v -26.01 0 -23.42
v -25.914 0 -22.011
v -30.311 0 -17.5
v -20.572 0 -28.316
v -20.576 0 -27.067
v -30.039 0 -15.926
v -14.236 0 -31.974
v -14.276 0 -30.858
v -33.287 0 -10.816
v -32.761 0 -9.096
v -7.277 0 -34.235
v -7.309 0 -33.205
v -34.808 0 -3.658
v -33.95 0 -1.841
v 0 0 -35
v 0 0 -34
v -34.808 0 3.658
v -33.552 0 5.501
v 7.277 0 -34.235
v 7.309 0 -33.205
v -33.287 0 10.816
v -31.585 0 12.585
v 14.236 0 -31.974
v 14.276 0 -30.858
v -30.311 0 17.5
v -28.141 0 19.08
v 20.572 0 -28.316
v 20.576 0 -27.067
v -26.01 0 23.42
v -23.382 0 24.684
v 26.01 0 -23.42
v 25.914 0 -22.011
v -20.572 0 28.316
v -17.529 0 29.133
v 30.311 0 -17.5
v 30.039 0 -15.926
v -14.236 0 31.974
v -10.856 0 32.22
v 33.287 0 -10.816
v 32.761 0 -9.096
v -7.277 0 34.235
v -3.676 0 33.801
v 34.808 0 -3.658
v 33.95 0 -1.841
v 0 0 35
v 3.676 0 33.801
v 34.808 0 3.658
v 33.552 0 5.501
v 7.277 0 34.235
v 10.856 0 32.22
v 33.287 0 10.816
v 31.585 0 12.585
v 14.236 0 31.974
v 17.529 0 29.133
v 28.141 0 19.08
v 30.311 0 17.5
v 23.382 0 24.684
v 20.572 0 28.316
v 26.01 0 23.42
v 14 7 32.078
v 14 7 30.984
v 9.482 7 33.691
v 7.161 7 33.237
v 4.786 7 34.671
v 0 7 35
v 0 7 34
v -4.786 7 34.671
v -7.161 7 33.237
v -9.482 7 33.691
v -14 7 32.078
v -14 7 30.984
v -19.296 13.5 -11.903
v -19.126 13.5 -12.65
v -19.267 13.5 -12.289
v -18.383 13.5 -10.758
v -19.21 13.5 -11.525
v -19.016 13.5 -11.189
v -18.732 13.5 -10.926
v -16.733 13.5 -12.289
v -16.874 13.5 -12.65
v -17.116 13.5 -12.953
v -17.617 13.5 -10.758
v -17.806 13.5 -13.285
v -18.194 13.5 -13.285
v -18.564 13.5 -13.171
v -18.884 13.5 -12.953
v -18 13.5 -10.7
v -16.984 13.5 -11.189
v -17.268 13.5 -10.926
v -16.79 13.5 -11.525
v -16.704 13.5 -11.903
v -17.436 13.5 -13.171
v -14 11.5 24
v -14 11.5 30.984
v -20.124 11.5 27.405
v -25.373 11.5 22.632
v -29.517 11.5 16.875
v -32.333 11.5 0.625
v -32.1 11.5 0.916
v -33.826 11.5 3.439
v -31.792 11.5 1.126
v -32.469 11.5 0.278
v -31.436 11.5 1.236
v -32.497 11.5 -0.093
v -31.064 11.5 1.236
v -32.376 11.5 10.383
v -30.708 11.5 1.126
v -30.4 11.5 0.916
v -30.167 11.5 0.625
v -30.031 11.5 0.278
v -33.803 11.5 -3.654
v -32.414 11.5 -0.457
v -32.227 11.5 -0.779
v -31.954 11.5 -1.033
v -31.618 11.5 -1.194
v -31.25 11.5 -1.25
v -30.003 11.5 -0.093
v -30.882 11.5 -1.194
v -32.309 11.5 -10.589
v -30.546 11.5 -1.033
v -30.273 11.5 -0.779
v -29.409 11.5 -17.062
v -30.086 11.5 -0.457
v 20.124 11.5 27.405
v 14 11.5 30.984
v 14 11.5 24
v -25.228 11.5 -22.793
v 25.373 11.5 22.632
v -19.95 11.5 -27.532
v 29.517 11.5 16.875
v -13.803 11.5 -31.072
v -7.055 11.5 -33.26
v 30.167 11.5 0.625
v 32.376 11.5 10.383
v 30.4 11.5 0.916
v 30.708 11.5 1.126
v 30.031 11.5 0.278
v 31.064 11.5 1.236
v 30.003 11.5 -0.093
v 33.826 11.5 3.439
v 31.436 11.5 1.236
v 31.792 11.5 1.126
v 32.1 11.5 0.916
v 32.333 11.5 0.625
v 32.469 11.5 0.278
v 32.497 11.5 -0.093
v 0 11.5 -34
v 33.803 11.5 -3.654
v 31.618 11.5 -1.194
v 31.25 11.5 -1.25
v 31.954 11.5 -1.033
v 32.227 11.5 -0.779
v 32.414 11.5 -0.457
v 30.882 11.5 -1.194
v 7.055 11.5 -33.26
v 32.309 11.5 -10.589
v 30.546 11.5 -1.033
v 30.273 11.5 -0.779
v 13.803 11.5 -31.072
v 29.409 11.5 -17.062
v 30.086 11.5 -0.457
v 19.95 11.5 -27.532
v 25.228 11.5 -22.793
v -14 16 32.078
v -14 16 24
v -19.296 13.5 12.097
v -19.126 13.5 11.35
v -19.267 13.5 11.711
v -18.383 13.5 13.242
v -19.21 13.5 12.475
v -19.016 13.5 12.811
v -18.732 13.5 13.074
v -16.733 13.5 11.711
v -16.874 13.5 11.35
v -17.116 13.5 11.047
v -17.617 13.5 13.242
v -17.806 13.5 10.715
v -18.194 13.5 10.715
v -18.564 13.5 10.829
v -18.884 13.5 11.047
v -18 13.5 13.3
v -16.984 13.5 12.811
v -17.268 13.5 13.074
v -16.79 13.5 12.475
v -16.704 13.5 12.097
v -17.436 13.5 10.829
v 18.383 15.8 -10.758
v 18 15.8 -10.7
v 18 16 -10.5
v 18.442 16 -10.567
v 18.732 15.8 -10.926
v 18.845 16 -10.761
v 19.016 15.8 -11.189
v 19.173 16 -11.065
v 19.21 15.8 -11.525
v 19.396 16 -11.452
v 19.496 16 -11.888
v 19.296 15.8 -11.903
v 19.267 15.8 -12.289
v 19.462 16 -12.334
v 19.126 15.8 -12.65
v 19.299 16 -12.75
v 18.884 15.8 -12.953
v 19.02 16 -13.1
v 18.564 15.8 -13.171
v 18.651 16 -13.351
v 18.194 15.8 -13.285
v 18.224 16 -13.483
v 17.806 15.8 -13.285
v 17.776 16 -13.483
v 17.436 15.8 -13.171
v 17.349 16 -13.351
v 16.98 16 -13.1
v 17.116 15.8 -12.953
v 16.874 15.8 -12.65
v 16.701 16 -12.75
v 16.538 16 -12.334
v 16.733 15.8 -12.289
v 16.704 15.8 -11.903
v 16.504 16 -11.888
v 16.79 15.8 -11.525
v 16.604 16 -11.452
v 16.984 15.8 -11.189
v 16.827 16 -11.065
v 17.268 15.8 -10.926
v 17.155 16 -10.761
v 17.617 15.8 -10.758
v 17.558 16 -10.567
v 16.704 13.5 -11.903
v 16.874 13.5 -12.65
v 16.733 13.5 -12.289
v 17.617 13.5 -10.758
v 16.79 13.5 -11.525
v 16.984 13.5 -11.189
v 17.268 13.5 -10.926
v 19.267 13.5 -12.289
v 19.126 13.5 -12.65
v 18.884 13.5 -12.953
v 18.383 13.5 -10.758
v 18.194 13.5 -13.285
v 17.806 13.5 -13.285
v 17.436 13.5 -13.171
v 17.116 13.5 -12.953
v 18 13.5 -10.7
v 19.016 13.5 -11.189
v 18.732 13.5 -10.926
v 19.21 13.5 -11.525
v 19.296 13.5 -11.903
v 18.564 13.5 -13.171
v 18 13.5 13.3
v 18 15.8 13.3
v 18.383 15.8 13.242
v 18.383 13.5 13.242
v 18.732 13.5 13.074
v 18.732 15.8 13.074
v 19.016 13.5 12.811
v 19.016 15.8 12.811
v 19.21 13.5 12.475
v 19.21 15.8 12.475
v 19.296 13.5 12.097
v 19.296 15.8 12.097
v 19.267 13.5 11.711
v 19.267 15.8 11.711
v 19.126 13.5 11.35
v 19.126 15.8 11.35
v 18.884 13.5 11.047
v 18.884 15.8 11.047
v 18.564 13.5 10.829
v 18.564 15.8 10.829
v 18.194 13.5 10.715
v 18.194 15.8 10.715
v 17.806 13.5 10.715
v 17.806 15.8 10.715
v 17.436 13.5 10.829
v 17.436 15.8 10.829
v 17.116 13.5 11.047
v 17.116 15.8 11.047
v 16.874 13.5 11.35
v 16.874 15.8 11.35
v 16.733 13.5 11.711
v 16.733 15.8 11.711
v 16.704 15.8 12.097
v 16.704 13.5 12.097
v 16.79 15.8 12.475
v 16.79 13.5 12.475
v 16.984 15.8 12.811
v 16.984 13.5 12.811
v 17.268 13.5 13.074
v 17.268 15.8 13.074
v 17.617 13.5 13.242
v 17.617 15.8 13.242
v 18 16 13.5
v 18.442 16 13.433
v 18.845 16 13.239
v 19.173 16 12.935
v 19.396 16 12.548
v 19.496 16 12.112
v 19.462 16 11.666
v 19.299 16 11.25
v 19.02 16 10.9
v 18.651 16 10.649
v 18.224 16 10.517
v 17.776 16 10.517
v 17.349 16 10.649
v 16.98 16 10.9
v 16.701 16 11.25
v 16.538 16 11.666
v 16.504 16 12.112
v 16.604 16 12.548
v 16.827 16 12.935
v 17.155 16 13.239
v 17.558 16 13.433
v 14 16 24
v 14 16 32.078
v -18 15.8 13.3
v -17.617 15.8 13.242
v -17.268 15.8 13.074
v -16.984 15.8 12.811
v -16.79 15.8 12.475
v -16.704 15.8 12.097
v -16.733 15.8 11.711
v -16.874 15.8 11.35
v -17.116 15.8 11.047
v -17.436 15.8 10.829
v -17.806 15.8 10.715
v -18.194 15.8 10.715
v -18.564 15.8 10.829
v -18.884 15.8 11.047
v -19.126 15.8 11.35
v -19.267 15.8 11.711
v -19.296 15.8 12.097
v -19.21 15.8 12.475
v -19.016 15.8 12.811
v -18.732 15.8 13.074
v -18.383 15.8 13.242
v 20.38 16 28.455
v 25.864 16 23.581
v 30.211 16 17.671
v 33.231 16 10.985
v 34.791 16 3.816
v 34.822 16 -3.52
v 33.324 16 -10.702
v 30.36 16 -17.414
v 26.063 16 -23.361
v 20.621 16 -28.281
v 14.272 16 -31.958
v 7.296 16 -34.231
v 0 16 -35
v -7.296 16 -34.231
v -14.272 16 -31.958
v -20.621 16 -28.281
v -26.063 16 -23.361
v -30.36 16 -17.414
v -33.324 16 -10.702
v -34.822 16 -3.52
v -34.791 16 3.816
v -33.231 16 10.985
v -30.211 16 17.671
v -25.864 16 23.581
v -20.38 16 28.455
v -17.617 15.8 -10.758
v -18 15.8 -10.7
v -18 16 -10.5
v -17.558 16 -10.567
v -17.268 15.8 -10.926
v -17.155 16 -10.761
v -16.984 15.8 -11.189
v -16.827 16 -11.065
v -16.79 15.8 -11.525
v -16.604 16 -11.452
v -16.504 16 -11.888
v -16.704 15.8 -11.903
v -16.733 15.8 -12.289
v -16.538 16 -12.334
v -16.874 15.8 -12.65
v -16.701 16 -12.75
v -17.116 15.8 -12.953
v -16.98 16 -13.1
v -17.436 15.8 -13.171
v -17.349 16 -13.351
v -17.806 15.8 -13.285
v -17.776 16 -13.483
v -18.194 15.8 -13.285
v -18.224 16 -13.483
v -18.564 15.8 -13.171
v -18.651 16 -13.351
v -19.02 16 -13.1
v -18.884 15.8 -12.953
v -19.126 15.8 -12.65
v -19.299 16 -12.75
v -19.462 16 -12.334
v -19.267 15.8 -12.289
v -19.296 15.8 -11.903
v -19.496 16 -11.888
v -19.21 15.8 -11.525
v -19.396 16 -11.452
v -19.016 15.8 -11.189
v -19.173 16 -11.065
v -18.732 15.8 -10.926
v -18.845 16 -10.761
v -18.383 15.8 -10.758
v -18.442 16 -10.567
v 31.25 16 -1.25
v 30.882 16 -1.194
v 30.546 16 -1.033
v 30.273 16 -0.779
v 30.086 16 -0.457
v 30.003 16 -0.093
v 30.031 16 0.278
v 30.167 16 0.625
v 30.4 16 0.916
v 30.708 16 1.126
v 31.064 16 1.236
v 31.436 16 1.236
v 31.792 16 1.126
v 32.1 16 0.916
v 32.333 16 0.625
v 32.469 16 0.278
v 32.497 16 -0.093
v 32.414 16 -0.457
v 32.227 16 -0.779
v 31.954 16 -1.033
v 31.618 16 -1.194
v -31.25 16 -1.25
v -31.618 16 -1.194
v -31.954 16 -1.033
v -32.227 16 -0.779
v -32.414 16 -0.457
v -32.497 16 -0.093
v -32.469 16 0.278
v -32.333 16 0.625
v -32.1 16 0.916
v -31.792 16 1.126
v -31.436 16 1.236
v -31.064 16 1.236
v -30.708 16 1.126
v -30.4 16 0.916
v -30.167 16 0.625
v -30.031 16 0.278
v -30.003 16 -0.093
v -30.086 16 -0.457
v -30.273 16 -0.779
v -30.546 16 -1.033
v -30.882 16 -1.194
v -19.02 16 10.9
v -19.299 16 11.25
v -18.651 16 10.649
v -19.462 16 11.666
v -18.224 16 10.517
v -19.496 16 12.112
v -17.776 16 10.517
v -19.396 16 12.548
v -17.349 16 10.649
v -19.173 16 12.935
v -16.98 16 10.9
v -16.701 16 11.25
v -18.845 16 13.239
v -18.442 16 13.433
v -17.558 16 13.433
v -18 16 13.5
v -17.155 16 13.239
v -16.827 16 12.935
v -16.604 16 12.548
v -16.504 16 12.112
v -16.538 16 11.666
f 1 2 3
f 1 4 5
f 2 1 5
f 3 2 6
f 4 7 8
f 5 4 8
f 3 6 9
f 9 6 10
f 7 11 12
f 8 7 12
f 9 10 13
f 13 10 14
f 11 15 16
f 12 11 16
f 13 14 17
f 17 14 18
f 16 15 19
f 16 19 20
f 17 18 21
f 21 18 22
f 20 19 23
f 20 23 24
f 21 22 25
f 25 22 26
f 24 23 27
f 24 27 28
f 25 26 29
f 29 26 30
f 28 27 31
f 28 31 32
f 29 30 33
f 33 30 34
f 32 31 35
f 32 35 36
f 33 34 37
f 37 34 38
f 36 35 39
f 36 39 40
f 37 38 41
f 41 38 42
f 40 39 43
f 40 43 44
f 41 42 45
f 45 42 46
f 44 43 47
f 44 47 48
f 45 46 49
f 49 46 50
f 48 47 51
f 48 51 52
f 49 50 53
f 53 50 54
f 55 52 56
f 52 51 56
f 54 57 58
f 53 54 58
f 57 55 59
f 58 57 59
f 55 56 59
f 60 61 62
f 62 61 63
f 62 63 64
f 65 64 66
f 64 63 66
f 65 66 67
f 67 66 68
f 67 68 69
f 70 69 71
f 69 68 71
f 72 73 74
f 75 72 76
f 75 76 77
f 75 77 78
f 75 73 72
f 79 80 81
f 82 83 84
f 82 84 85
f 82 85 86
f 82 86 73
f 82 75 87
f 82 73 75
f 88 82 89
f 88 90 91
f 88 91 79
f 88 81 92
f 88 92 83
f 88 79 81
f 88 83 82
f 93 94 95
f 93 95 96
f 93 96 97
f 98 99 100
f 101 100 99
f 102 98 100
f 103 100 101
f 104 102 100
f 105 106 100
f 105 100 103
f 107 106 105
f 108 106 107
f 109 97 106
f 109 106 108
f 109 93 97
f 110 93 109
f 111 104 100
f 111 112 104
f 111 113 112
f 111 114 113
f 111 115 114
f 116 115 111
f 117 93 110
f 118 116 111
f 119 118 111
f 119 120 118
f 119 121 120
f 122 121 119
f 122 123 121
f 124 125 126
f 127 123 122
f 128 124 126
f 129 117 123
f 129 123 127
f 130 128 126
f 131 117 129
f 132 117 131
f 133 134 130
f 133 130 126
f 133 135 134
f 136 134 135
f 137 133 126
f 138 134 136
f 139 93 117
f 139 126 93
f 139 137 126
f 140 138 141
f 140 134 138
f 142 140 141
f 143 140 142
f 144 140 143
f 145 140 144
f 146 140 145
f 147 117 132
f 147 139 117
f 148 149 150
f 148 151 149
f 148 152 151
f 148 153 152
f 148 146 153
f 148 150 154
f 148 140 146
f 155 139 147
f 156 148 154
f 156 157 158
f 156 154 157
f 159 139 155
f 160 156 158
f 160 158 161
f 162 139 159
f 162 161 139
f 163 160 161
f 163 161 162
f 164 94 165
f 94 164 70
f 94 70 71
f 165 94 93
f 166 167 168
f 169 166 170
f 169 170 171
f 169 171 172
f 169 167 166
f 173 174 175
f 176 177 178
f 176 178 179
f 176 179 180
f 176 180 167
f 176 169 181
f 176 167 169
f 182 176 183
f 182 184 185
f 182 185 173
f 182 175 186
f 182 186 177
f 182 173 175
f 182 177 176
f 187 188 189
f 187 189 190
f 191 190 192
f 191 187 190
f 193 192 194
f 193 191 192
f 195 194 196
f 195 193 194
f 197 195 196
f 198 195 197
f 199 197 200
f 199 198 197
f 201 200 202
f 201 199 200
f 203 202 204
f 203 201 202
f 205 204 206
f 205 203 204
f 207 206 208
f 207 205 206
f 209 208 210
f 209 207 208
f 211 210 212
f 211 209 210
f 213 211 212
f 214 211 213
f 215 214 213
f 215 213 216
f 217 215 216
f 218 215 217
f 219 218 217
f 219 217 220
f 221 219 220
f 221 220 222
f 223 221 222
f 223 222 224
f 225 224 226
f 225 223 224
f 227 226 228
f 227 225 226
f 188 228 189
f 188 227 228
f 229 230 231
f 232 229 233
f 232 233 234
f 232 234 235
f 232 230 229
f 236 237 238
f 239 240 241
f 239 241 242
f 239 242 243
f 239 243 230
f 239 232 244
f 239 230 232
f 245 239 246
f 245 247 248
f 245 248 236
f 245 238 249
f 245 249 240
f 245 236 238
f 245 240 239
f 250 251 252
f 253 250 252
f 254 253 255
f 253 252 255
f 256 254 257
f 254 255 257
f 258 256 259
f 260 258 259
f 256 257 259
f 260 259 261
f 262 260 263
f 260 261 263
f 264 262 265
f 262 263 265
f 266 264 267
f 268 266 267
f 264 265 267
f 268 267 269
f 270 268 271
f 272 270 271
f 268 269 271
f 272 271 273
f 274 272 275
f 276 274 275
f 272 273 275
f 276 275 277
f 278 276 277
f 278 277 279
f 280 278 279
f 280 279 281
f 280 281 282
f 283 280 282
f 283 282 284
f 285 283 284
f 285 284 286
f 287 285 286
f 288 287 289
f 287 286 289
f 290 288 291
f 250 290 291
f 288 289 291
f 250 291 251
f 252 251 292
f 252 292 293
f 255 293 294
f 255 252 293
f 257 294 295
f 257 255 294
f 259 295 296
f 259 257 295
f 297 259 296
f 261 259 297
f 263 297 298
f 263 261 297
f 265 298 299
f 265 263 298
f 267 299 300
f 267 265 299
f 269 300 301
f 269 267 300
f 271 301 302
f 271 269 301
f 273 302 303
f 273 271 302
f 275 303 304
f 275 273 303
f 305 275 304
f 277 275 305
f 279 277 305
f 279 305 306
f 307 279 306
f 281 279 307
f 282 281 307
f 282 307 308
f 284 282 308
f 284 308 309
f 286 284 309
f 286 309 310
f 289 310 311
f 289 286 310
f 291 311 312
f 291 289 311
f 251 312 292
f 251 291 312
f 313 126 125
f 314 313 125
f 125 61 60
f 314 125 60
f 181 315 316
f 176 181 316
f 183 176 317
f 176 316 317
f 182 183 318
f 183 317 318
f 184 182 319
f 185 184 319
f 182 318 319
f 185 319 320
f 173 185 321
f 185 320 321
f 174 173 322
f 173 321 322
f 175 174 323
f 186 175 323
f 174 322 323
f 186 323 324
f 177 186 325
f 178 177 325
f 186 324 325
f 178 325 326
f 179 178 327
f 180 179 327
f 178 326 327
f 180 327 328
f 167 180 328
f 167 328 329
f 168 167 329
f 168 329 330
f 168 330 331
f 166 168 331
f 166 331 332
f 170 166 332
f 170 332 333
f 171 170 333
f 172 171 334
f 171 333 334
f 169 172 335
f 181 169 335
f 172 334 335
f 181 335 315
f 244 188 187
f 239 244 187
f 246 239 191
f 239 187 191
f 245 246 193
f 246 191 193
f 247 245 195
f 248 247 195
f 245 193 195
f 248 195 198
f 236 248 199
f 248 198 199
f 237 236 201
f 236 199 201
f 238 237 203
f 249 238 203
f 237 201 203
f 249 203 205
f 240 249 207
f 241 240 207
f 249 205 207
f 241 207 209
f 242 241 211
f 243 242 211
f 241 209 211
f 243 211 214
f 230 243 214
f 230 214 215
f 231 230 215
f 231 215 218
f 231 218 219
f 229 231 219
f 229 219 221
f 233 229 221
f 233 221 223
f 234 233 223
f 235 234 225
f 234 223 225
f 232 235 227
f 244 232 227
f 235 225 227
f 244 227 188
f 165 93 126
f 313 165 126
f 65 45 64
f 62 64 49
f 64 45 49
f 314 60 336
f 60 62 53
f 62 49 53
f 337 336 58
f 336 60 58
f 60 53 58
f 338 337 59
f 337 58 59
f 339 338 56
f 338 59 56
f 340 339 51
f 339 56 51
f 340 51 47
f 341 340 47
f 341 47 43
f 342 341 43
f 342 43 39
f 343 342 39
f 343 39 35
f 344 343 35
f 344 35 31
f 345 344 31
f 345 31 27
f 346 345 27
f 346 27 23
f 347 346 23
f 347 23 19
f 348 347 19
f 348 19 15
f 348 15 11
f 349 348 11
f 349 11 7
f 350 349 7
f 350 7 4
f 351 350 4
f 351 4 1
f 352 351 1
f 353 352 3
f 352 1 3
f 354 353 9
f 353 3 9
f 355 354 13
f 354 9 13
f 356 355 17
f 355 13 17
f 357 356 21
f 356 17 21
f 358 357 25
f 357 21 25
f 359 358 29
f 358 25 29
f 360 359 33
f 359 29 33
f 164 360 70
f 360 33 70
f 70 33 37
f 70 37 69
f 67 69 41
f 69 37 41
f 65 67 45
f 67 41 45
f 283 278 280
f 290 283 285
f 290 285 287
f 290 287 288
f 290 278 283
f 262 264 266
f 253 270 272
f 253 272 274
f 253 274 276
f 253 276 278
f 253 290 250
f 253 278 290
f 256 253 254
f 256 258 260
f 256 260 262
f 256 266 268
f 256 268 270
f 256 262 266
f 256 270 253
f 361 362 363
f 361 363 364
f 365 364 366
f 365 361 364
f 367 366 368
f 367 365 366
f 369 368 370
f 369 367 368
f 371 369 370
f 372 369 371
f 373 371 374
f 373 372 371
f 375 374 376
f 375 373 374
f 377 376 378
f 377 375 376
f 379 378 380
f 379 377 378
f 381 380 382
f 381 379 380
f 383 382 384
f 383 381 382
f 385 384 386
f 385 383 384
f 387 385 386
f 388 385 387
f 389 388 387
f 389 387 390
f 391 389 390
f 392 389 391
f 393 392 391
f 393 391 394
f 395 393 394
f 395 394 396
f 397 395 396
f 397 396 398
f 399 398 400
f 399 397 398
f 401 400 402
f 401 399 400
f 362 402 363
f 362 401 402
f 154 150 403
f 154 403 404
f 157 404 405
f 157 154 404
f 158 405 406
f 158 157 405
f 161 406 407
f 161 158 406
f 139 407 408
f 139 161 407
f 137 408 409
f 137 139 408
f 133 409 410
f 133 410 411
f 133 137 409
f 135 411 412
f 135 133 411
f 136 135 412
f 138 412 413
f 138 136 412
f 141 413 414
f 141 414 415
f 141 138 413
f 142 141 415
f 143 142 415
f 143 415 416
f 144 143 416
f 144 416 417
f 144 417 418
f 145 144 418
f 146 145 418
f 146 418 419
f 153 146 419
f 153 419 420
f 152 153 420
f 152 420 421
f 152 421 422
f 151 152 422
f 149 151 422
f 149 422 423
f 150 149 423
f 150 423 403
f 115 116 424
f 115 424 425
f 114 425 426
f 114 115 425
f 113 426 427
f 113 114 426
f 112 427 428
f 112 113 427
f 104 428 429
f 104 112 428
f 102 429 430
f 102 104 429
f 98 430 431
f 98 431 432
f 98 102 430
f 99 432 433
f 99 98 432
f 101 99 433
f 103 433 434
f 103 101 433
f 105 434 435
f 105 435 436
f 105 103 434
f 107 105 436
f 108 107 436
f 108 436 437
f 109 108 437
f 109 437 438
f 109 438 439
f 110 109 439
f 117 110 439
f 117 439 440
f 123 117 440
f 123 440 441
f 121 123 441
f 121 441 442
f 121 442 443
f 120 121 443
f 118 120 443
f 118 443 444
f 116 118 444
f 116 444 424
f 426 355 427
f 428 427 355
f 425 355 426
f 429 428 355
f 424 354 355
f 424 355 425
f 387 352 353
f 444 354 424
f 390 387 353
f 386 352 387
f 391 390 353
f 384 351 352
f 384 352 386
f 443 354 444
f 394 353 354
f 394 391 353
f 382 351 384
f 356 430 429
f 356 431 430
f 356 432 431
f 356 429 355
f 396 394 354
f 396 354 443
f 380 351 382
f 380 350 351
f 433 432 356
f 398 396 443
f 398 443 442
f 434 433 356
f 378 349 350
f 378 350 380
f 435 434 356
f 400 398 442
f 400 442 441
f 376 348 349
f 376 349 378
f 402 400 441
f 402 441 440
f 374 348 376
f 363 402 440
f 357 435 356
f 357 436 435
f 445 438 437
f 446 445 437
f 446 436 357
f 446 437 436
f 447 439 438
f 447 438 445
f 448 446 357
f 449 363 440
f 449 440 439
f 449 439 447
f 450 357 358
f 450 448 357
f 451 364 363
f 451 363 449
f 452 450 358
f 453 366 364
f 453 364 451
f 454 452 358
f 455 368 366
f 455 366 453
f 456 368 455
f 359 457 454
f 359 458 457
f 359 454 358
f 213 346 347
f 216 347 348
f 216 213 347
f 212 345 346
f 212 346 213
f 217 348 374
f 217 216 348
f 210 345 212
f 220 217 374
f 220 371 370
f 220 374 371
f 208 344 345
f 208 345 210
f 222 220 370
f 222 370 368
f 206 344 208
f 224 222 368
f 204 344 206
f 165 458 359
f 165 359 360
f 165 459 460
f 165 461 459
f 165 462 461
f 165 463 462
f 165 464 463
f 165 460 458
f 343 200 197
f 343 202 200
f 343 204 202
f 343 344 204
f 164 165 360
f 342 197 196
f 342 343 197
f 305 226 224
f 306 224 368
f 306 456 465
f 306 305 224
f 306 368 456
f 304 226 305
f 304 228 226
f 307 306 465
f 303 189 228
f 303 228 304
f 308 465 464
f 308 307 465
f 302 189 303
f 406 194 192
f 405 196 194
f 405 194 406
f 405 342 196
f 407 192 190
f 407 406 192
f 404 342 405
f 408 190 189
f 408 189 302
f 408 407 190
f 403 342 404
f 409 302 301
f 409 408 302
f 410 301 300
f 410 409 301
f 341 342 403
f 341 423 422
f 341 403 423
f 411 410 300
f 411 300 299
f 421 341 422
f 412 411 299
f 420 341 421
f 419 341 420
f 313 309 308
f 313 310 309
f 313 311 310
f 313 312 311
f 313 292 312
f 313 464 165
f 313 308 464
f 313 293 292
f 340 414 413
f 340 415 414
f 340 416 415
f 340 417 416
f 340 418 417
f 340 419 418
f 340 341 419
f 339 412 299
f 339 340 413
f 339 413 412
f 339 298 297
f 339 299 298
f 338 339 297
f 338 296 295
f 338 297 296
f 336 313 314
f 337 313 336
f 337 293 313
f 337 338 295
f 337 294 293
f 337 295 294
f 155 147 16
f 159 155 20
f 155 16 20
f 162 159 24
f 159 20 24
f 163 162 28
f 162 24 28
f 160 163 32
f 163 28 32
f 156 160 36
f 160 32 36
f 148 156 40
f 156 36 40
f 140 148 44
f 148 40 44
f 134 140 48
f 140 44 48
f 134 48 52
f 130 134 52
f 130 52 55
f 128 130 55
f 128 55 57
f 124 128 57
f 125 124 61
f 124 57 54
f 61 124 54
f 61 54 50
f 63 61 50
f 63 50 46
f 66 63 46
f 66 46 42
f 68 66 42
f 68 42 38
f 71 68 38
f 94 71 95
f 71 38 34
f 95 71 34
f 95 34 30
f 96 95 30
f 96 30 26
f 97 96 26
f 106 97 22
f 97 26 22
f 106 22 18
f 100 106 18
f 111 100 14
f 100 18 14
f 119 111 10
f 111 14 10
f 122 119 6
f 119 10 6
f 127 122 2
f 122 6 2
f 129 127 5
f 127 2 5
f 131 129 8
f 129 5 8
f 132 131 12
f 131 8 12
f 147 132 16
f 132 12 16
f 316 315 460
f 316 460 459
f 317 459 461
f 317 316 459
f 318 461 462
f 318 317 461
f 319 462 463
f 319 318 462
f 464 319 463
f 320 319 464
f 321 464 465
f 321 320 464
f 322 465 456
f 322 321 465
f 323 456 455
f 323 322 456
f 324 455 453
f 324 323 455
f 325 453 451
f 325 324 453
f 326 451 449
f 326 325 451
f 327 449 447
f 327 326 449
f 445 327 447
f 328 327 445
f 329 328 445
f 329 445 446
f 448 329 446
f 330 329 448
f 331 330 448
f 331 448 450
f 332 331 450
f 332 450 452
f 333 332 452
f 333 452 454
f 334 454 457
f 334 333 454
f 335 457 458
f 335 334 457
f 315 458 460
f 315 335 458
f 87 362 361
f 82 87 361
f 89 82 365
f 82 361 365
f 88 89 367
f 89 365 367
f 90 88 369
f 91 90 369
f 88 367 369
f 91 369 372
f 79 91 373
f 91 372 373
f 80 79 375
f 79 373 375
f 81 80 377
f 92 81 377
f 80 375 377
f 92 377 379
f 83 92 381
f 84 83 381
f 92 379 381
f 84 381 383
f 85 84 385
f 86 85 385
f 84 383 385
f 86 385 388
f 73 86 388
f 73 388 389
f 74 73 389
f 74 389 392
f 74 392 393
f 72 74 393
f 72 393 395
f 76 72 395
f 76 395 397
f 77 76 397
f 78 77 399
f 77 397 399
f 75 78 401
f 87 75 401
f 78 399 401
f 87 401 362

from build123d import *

# Parameters (mm, degrees)
SKETCH_1_R          = 35
EXTRUDE_1_DEPTH     = 16
SKETCH_2_R          = 34
CUT_EXTRUDE_1_DEPTH = 11.5
SKETCH_3_R          = 1.25
CUT_EXTRUDE_4_DEPTH = 16
CUT_EXTRUDE_START   = -9
CUT_EXTRUDE_5_DEPTH = 9
SKETCH_5_R          = 1.3
CUT_EXTRUDE_6_DEPTH = 2.5
CHAMFER_1_SIZE      = 0.2


with BuildPart() as part:
    # 草圖1 → 填料-伸長1 (new body)
    with BuildSketch(Plane(origin=(0, 0, 0), x_dir=(1, 0, 0), z_dir=(0, 1, 0))):
        with Locations(Location((0, 0, 0), (0, 0, 270))):
            Circle(SKETCH_1_R)
    extrude(amount=EXTRUDE_1_DEPTH)

    # 草圖2 → 除料-伸長1 (cut)
    with BuildSketch(Plane.XZ):
        with Locations(Location((0, 0, 0), (0, 0, 270))):
            Circle(SKETCH_2_R)
    extrude(amount=-CUT_EXTRUDE_1_DEPTH, mode=Mode.SUBTRACT)

    # 草圖3 → 除料-伸長4 (cut)
    with BuildSketch(Plane(origin=(0, 0, 0), x_dir=(1, 0, 0), z_dir=(0, 1, 0))):
        with Locations(Location((-31.25, 0, 0), (0, 0, 90))):
            Circle(SKETCH_3_R)
        with Locations(Location((31.25, 0, 0), (0, 0, 90))):
            Circle(SKETCH_3_R)
    extrude(amount=CUT_EXTRUDE_4_DEPTH, mode=Mode.SUBTRACT)

    # 草圖4 → 除料-伸長5 (cut)
    with BuildSketch(Plane(origin=(0, 16, 0), x_dir=(1, 0, 0), z_dir=(0, 1, 0)).offset(CUT_EXTRUDE_START)):
        with BuildLine():
            Line((-14, -24), (14, -24))
            Line((14, -24), (14, -32.078029865))
            ThreePointArc((14, -32.078029865), (0, -35), (-14, -32.078029865))
            Line((-14, -32.078029865), (-14, -24))
        make_face()
    extrude(amount=CUT_EXTRUDE_5_DEPTH, mode=Mode.SUBTRACT)

    # 草圖5 → 除料-伸長6 (cut)
    with BuildSketch(Plane(origin=(0, 16, 0), x_dir=(1, 0, 0), z_dir=(0, 1, 0))):
        with Locations(Location((-18, 12, 0), (0, 0, 270))):
            Circle(SKETCH_5_R)
        with Locations(Location((18, 12, 0), (0, 0, 270))):
            Circle(SKETCH_5_R)
        with Locations(Location((18, -12, 0), (0, 0, 270))):
            Circle(SKETCH_5_R)
        with Locations(Location((-18, -12, 0), (0, 0, 270))):
            Circle(SKETCH_5_R)
    extrude(amount=-CUT_EXTRUDE_6_DEPTH, mode=Mode.SUBTRACT)

    # 導角1
    chamfer_1_edges = [part.edges().sort_by_distance(p)[0] for p in [
        (-18, 16, 10.7),
        (18, 16, 10.7),
        (18, 16, -13.3),
        (-18, 16, -13.3),
    ]]
    chamfer(chamfer_1_edges, length=CHAMFER_1_SIZE)


solid = part.part
